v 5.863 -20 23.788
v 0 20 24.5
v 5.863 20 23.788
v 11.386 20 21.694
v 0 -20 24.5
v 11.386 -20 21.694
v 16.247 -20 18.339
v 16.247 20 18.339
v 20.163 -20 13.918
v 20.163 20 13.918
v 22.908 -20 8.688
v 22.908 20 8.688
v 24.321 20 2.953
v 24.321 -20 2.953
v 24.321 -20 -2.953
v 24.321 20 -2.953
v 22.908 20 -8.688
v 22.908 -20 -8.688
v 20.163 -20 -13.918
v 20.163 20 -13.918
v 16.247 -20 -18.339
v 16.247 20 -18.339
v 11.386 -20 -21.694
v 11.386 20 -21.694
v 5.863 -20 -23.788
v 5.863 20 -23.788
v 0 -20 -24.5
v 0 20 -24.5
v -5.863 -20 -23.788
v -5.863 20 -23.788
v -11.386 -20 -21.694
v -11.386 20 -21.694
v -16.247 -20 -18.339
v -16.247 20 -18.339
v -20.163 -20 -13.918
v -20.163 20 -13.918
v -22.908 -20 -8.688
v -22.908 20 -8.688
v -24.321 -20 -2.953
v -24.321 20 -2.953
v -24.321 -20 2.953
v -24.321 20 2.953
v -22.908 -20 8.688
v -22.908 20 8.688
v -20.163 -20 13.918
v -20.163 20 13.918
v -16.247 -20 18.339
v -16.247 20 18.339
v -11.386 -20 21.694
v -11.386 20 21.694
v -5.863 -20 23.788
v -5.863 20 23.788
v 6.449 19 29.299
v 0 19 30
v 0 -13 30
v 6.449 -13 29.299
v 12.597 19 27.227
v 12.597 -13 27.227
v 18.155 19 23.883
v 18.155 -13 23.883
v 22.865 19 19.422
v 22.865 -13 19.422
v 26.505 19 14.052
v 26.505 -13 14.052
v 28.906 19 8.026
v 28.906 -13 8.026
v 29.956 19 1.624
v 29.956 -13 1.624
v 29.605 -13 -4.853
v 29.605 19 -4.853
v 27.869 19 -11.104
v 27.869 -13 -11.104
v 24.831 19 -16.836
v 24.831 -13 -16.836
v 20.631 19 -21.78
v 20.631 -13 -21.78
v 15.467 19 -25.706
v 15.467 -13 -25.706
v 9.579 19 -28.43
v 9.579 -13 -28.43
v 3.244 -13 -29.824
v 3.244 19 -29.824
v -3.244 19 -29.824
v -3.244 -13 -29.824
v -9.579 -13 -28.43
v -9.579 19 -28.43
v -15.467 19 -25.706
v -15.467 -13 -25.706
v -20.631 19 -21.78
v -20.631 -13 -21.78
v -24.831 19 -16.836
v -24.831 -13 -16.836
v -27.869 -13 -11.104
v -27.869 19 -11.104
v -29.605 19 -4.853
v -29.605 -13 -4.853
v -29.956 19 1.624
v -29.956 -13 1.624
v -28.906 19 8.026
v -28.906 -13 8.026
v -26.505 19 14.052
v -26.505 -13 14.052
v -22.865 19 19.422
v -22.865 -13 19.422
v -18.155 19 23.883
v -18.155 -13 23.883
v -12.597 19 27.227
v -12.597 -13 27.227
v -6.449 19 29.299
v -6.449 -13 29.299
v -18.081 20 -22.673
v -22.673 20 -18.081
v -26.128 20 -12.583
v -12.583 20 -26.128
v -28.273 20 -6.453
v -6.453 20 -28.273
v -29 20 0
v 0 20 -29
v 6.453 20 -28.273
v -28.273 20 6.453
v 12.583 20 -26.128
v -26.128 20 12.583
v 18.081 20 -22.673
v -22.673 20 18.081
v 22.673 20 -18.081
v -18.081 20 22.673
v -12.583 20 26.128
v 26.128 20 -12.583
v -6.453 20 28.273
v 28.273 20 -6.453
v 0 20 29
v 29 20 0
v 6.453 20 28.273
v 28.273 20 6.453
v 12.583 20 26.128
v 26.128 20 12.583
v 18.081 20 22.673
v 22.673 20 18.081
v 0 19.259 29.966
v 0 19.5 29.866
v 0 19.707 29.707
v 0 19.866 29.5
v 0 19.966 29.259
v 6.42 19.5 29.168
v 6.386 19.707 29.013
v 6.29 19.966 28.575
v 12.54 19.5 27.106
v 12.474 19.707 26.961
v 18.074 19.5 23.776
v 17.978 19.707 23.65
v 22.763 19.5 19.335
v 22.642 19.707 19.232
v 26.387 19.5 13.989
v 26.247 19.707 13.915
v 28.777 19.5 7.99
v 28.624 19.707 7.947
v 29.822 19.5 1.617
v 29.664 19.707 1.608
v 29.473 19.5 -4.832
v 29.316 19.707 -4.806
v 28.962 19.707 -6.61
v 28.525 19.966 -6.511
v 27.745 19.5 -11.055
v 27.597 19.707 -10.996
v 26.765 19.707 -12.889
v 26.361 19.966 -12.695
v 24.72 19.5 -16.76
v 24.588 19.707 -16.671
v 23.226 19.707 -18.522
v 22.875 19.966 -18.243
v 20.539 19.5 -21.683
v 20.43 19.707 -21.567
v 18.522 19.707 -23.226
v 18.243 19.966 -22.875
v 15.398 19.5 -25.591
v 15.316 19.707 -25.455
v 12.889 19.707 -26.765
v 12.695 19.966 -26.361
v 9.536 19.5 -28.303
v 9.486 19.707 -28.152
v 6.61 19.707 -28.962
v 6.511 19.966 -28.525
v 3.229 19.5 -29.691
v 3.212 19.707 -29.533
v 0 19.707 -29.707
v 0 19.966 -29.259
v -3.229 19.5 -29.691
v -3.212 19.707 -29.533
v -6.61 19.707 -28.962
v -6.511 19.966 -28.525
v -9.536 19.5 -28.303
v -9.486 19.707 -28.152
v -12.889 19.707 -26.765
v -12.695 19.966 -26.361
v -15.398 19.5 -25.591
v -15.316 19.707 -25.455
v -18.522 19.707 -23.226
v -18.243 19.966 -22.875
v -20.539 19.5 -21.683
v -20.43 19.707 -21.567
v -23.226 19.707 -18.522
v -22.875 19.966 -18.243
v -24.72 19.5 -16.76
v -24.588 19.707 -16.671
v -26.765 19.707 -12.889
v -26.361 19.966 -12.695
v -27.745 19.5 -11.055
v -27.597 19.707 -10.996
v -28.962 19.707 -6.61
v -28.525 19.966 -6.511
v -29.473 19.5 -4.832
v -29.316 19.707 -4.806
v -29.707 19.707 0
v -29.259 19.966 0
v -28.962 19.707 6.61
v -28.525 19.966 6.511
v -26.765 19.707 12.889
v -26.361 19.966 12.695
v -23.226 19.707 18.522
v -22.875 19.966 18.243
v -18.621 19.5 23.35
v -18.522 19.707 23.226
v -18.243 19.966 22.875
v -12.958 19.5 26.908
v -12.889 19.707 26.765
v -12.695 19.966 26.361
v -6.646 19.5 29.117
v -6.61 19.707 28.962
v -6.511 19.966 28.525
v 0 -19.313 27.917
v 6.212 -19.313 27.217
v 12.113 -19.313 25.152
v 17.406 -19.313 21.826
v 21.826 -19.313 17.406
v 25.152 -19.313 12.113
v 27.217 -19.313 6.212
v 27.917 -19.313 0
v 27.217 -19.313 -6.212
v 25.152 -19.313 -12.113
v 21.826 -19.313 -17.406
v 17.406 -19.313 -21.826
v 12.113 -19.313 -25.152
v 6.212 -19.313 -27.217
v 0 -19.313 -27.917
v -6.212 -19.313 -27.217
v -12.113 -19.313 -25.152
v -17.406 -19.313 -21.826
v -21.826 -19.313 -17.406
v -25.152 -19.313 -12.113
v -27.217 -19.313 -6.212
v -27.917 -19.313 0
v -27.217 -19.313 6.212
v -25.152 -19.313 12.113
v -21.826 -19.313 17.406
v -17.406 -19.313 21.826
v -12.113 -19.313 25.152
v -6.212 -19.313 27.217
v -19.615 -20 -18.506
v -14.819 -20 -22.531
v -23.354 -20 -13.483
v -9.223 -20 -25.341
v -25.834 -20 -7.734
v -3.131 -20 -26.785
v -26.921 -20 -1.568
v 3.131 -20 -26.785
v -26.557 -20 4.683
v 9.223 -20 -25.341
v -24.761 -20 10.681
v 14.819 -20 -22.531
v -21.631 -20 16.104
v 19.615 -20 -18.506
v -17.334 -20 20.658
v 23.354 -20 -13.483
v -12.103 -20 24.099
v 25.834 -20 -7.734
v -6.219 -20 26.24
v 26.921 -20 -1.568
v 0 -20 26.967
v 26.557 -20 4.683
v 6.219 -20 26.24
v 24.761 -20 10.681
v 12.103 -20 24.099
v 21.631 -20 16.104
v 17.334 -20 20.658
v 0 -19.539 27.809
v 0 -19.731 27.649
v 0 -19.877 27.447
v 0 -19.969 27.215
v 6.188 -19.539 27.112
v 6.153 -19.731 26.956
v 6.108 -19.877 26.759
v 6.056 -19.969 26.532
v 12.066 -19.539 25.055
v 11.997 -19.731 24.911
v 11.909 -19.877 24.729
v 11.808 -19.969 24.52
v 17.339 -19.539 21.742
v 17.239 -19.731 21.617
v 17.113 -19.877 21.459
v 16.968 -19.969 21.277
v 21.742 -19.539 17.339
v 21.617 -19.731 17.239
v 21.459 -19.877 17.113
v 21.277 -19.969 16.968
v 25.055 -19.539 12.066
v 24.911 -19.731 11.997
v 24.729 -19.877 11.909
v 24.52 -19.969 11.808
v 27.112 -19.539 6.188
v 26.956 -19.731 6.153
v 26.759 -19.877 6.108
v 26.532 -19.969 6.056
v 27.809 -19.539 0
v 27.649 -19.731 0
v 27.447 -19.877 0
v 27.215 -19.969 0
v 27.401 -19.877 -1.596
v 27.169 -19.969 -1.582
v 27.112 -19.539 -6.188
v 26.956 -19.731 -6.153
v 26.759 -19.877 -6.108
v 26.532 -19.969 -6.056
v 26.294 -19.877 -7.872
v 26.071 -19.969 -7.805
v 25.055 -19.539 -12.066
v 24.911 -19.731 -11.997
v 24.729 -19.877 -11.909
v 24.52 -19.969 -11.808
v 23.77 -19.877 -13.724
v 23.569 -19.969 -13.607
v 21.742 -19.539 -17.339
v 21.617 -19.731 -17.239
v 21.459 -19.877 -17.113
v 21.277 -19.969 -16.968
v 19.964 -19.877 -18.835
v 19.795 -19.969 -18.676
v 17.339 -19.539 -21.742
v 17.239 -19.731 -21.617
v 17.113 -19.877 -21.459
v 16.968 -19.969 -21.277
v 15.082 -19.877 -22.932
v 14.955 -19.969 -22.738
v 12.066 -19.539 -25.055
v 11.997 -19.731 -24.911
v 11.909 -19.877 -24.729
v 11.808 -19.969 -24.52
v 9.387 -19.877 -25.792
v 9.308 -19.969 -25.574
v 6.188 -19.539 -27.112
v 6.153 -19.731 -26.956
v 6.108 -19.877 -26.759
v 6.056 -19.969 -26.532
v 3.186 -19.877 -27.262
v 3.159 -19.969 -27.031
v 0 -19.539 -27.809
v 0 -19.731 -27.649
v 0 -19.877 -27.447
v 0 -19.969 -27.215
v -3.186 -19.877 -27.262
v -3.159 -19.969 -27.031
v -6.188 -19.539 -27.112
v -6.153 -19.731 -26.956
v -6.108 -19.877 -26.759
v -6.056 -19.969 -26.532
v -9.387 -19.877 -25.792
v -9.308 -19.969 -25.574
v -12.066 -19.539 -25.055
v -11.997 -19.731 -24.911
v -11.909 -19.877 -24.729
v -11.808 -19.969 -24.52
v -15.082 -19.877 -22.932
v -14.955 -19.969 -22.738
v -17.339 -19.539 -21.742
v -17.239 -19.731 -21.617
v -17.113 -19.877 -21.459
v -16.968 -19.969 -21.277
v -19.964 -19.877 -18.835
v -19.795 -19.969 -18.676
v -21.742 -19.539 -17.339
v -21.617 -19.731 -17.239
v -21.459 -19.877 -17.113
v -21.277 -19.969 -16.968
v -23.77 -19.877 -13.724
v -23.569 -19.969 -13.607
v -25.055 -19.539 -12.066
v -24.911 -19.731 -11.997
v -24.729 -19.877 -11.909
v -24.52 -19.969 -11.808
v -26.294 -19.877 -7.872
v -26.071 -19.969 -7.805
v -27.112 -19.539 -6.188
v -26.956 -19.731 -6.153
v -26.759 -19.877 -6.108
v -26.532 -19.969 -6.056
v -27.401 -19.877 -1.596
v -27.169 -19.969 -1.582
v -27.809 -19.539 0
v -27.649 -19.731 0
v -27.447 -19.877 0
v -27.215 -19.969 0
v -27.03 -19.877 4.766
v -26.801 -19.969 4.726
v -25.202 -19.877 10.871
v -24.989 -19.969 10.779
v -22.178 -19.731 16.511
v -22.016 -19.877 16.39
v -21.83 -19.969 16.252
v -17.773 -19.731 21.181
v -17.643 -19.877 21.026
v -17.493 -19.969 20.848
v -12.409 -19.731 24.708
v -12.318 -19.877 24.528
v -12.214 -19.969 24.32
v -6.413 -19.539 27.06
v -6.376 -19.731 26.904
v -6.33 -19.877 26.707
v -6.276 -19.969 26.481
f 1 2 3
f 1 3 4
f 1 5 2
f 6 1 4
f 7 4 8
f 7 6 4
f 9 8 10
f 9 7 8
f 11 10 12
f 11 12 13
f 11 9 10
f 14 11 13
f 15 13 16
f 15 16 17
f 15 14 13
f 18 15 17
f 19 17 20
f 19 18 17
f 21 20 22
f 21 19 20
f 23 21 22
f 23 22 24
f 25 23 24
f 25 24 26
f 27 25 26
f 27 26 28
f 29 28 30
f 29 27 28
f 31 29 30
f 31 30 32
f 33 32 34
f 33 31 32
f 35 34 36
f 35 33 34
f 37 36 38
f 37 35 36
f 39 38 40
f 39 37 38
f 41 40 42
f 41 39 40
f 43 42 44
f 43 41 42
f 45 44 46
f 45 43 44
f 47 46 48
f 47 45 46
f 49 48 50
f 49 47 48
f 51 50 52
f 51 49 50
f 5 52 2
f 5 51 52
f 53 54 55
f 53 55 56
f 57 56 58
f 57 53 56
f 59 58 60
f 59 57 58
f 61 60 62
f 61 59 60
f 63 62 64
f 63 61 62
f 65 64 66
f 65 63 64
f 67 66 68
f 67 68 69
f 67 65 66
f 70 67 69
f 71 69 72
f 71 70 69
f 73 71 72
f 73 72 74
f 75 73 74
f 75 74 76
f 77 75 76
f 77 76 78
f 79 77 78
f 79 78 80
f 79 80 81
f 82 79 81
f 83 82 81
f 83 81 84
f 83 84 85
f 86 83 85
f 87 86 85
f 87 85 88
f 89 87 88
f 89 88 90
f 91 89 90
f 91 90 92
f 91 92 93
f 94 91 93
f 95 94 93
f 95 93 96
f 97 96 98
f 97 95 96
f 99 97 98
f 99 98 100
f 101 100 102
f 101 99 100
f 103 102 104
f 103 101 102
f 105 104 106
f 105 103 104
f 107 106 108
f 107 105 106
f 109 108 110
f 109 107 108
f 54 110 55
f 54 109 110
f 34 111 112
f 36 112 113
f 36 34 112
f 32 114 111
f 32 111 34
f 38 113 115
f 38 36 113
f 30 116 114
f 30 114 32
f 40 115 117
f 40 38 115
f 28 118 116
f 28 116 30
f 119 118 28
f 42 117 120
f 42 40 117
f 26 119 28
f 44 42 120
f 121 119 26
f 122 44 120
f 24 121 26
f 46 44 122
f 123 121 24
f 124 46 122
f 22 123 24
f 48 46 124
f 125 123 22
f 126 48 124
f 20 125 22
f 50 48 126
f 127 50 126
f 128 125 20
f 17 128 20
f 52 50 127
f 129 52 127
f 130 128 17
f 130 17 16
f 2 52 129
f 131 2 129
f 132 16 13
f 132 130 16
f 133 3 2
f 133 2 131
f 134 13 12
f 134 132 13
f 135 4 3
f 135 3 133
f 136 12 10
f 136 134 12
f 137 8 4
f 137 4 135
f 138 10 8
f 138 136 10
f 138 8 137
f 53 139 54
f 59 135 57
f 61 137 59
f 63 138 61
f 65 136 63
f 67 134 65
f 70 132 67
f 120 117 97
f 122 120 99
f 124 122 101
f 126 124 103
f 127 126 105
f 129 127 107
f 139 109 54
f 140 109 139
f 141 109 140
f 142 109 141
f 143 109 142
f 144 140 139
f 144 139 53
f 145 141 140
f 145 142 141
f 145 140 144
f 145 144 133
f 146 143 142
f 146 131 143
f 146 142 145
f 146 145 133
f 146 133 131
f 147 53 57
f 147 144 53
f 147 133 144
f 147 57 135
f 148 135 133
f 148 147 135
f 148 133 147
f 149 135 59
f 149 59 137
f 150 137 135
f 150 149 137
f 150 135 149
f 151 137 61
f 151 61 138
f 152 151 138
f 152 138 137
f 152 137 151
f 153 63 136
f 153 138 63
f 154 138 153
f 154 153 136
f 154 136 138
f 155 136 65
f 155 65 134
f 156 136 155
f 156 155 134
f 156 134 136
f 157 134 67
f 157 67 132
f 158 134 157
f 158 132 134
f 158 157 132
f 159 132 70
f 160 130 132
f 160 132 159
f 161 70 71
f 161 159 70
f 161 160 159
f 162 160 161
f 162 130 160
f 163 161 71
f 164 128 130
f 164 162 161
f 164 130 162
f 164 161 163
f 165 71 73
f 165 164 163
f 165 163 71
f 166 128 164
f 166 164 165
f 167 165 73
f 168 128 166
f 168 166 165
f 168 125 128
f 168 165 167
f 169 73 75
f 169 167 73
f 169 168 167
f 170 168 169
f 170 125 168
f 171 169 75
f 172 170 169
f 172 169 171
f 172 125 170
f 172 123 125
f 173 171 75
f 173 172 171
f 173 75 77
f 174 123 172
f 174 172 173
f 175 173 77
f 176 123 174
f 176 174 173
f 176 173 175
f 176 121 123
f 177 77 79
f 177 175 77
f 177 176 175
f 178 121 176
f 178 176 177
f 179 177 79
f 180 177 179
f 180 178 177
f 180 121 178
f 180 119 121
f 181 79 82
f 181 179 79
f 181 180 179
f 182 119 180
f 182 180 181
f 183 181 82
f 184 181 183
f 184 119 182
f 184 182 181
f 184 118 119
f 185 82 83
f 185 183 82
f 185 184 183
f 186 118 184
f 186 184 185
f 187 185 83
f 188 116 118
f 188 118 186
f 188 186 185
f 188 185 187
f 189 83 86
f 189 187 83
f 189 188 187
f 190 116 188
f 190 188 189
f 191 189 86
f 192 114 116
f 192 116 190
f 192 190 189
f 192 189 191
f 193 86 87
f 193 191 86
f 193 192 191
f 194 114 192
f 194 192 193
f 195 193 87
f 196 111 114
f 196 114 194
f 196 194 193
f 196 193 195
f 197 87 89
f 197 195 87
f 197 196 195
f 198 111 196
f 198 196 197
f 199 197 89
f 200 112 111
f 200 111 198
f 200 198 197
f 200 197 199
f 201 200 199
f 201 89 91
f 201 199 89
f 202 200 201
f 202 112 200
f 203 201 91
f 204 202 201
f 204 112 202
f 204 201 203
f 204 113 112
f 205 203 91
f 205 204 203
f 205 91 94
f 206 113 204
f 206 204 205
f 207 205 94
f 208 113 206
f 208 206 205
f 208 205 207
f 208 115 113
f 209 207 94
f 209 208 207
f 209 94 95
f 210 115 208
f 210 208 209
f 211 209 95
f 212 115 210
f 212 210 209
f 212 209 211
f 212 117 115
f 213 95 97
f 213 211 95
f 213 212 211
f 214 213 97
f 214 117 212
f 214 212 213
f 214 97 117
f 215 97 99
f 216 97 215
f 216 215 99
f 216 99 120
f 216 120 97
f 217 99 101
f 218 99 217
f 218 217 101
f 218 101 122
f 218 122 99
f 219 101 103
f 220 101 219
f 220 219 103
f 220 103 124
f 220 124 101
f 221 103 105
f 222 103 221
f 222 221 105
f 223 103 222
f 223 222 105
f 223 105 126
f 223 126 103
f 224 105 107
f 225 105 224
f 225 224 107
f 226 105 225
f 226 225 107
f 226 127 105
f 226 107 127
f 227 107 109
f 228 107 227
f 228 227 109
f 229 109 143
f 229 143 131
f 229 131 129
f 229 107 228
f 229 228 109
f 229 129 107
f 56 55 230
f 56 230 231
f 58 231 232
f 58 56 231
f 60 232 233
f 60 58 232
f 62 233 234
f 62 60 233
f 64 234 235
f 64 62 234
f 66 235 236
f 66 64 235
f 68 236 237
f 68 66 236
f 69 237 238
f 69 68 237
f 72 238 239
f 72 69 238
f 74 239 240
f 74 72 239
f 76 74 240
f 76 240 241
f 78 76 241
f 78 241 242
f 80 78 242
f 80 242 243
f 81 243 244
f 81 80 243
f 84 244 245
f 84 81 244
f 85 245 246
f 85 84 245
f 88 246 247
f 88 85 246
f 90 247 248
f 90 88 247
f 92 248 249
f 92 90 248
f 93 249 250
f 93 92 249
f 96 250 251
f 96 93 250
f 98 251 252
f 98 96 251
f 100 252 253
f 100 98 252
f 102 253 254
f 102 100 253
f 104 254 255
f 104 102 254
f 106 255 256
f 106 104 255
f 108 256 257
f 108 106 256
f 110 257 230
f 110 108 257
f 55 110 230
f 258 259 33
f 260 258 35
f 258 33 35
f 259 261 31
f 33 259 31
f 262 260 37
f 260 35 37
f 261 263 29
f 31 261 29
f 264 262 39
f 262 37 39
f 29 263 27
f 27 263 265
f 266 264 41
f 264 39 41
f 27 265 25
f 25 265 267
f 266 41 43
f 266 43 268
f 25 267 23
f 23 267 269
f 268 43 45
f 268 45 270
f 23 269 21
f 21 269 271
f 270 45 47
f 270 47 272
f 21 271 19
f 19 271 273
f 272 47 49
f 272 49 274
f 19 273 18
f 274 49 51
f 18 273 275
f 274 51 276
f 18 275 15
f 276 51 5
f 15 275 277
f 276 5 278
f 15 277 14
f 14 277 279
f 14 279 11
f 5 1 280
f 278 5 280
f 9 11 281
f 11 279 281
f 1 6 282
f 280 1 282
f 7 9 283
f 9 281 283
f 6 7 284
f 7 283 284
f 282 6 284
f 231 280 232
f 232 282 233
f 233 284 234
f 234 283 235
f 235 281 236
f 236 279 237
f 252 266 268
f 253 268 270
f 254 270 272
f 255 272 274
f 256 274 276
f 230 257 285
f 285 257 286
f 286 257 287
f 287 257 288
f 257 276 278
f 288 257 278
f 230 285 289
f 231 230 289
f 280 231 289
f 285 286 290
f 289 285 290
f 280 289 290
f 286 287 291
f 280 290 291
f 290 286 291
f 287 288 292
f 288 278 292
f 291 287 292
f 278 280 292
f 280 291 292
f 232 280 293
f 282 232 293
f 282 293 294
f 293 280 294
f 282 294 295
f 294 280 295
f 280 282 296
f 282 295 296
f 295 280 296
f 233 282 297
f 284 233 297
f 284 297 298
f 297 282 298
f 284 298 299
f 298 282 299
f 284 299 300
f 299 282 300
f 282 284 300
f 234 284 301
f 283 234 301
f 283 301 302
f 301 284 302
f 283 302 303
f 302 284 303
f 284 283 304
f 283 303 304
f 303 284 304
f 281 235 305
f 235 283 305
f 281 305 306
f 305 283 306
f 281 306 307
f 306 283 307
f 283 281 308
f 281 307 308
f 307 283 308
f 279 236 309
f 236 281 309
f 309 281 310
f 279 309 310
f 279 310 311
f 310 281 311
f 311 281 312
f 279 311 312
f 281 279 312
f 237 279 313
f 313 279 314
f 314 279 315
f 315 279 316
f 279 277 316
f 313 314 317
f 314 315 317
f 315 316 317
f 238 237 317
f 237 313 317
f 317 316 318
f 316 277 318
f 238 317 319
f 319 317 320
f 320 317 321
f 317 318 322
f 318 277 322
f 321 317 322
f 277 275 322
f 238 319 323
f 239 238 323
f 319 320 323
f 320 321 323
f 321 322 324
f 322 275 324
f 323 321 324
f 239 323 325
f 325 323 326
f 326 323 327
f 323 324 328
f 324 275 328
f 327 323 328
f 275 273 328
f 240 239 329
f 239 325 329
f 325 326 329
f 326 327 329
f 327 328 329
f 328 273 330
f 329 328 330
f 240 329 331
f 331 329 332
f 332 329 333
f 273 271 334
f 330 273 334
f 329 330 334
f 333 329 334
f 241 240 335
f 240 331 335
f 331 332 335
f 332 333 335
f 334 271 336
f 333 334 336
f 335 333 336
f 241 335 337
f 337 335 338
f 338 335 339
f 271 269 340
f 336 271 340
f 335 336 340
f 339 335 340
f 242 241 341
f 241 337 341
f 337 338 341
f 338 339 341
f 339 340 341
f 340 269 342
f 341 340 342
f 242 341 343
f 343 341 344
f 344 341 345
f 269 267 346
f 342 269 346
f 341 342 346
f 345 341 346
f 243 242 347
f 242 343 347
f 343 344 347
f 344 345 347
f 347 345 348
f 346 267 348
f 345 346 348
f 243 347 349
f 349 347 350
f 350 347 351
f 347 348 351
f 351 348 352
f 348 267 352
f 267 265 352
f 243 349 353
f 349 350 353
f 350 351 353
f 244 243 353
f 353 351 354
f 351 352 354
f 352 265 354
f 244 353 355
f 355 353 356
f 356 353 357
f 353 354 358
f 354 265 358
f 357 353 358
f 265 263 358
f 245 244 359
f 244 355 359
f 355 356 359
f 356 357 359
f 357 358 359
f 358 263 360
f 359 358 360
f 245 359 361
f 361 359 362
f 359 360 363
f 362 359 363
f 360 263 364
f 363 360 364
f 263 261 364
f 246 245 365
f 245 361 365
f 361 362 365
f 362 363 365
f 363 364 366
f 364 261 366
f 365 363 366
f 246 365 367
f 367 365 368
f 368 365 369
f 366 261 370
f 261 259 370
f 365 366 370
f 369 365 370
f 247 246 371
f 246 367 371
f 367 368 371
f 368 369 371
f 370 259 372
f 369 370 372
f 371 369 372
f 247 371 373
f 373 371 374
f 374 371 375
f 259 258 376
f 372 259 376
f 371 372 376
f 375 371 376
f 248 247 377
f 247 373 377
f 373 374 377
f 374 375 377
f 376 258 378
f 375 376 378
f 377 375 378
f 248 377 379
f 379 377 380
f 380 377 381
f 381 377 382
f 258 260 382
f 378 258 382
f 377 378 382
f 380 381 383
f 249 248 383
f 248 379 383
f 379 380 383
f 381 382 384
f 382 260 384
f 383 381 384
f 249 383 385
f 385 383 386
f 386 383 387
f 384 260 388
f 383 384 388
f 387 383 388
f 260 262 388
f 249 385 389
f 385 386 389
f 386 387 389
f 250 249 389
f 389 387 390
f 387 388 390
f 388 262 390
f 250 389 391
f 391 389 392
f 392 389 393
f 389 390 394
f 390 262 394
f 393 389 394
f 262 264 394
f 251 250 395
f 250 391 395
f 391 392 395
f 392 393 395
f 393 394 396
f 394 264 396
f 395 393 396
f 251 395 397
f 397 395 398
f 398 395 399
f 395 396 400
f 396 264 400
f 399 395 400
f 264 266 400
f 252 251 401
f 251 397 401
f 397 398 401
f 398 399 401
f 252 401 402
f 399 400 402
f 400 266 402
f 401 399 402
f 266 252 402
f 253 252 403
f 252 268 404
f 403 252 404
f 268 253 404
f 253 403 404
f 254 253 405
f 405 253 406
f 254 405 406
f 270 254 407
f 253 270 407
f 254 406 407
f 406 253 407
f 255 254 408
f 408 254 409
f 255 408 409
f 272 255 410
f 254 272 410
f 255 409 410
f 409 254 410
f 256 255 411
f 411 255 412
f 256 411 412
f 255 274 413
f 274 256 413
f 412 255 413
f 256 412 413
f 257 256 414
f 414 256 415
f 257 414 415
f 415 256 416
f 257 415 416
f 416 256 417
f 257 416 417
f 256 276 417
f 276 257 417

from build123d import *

# Parameters (mm, degrees)
SKETCH1_R           = 30
SKETCH1_R_2         = 24.5
BOSS_EXTRUDE1_DEPTH = 20
CHAMFER2_SIZE       = 2.31
CHAMFER2_SIZE2      = 7
FILLET1_R           = 1


with BuildPart() as part:
    # Sketch1 → Boss-Extrude1 (new, symmetric)
    with BuildSketch(Plane(origin=(0, 0, 0), x_dir=(1, 0, 0), z_dir=(0, 1, 0))):
        with Locations(Location((0, 0, 0), (0, 0, 270))):
            Circle(SKETCH1_R)
        with Locations(Location((0, 0, 0), (0, 0, 270))):
            Circle(SKETCH1_R_2, mode=Mode.SUBTRACT)
    extrude(amount=BOSS_EXTRUDE1_DEPTH, both=True)

    # Chamfer2
    chamfer2_edges = [part.edges().sort_by_distance(p)[0] for p in [
        (0, -20, -30),
    ]]
    chamfer2_side = [part.faces().sort_by_distance(p)[0] for p in [
        (0, -20, -29.151471863),
    ]]
    chamfer(chamfer2_edges, length=CHAMFER2_SIZE, length2=CHAMFER2_SIZE2, reference=chamfer2_side[0])

    # Fillet1
    fillet1_edges = [part.edges().sort_by_distance(p)[0] for p in [
        (0, -20, -27.69),
        (0, 20, -30),
    ]]
    fillet(fillet1_edges, radius=FILLET1_R)


solid = part.part
